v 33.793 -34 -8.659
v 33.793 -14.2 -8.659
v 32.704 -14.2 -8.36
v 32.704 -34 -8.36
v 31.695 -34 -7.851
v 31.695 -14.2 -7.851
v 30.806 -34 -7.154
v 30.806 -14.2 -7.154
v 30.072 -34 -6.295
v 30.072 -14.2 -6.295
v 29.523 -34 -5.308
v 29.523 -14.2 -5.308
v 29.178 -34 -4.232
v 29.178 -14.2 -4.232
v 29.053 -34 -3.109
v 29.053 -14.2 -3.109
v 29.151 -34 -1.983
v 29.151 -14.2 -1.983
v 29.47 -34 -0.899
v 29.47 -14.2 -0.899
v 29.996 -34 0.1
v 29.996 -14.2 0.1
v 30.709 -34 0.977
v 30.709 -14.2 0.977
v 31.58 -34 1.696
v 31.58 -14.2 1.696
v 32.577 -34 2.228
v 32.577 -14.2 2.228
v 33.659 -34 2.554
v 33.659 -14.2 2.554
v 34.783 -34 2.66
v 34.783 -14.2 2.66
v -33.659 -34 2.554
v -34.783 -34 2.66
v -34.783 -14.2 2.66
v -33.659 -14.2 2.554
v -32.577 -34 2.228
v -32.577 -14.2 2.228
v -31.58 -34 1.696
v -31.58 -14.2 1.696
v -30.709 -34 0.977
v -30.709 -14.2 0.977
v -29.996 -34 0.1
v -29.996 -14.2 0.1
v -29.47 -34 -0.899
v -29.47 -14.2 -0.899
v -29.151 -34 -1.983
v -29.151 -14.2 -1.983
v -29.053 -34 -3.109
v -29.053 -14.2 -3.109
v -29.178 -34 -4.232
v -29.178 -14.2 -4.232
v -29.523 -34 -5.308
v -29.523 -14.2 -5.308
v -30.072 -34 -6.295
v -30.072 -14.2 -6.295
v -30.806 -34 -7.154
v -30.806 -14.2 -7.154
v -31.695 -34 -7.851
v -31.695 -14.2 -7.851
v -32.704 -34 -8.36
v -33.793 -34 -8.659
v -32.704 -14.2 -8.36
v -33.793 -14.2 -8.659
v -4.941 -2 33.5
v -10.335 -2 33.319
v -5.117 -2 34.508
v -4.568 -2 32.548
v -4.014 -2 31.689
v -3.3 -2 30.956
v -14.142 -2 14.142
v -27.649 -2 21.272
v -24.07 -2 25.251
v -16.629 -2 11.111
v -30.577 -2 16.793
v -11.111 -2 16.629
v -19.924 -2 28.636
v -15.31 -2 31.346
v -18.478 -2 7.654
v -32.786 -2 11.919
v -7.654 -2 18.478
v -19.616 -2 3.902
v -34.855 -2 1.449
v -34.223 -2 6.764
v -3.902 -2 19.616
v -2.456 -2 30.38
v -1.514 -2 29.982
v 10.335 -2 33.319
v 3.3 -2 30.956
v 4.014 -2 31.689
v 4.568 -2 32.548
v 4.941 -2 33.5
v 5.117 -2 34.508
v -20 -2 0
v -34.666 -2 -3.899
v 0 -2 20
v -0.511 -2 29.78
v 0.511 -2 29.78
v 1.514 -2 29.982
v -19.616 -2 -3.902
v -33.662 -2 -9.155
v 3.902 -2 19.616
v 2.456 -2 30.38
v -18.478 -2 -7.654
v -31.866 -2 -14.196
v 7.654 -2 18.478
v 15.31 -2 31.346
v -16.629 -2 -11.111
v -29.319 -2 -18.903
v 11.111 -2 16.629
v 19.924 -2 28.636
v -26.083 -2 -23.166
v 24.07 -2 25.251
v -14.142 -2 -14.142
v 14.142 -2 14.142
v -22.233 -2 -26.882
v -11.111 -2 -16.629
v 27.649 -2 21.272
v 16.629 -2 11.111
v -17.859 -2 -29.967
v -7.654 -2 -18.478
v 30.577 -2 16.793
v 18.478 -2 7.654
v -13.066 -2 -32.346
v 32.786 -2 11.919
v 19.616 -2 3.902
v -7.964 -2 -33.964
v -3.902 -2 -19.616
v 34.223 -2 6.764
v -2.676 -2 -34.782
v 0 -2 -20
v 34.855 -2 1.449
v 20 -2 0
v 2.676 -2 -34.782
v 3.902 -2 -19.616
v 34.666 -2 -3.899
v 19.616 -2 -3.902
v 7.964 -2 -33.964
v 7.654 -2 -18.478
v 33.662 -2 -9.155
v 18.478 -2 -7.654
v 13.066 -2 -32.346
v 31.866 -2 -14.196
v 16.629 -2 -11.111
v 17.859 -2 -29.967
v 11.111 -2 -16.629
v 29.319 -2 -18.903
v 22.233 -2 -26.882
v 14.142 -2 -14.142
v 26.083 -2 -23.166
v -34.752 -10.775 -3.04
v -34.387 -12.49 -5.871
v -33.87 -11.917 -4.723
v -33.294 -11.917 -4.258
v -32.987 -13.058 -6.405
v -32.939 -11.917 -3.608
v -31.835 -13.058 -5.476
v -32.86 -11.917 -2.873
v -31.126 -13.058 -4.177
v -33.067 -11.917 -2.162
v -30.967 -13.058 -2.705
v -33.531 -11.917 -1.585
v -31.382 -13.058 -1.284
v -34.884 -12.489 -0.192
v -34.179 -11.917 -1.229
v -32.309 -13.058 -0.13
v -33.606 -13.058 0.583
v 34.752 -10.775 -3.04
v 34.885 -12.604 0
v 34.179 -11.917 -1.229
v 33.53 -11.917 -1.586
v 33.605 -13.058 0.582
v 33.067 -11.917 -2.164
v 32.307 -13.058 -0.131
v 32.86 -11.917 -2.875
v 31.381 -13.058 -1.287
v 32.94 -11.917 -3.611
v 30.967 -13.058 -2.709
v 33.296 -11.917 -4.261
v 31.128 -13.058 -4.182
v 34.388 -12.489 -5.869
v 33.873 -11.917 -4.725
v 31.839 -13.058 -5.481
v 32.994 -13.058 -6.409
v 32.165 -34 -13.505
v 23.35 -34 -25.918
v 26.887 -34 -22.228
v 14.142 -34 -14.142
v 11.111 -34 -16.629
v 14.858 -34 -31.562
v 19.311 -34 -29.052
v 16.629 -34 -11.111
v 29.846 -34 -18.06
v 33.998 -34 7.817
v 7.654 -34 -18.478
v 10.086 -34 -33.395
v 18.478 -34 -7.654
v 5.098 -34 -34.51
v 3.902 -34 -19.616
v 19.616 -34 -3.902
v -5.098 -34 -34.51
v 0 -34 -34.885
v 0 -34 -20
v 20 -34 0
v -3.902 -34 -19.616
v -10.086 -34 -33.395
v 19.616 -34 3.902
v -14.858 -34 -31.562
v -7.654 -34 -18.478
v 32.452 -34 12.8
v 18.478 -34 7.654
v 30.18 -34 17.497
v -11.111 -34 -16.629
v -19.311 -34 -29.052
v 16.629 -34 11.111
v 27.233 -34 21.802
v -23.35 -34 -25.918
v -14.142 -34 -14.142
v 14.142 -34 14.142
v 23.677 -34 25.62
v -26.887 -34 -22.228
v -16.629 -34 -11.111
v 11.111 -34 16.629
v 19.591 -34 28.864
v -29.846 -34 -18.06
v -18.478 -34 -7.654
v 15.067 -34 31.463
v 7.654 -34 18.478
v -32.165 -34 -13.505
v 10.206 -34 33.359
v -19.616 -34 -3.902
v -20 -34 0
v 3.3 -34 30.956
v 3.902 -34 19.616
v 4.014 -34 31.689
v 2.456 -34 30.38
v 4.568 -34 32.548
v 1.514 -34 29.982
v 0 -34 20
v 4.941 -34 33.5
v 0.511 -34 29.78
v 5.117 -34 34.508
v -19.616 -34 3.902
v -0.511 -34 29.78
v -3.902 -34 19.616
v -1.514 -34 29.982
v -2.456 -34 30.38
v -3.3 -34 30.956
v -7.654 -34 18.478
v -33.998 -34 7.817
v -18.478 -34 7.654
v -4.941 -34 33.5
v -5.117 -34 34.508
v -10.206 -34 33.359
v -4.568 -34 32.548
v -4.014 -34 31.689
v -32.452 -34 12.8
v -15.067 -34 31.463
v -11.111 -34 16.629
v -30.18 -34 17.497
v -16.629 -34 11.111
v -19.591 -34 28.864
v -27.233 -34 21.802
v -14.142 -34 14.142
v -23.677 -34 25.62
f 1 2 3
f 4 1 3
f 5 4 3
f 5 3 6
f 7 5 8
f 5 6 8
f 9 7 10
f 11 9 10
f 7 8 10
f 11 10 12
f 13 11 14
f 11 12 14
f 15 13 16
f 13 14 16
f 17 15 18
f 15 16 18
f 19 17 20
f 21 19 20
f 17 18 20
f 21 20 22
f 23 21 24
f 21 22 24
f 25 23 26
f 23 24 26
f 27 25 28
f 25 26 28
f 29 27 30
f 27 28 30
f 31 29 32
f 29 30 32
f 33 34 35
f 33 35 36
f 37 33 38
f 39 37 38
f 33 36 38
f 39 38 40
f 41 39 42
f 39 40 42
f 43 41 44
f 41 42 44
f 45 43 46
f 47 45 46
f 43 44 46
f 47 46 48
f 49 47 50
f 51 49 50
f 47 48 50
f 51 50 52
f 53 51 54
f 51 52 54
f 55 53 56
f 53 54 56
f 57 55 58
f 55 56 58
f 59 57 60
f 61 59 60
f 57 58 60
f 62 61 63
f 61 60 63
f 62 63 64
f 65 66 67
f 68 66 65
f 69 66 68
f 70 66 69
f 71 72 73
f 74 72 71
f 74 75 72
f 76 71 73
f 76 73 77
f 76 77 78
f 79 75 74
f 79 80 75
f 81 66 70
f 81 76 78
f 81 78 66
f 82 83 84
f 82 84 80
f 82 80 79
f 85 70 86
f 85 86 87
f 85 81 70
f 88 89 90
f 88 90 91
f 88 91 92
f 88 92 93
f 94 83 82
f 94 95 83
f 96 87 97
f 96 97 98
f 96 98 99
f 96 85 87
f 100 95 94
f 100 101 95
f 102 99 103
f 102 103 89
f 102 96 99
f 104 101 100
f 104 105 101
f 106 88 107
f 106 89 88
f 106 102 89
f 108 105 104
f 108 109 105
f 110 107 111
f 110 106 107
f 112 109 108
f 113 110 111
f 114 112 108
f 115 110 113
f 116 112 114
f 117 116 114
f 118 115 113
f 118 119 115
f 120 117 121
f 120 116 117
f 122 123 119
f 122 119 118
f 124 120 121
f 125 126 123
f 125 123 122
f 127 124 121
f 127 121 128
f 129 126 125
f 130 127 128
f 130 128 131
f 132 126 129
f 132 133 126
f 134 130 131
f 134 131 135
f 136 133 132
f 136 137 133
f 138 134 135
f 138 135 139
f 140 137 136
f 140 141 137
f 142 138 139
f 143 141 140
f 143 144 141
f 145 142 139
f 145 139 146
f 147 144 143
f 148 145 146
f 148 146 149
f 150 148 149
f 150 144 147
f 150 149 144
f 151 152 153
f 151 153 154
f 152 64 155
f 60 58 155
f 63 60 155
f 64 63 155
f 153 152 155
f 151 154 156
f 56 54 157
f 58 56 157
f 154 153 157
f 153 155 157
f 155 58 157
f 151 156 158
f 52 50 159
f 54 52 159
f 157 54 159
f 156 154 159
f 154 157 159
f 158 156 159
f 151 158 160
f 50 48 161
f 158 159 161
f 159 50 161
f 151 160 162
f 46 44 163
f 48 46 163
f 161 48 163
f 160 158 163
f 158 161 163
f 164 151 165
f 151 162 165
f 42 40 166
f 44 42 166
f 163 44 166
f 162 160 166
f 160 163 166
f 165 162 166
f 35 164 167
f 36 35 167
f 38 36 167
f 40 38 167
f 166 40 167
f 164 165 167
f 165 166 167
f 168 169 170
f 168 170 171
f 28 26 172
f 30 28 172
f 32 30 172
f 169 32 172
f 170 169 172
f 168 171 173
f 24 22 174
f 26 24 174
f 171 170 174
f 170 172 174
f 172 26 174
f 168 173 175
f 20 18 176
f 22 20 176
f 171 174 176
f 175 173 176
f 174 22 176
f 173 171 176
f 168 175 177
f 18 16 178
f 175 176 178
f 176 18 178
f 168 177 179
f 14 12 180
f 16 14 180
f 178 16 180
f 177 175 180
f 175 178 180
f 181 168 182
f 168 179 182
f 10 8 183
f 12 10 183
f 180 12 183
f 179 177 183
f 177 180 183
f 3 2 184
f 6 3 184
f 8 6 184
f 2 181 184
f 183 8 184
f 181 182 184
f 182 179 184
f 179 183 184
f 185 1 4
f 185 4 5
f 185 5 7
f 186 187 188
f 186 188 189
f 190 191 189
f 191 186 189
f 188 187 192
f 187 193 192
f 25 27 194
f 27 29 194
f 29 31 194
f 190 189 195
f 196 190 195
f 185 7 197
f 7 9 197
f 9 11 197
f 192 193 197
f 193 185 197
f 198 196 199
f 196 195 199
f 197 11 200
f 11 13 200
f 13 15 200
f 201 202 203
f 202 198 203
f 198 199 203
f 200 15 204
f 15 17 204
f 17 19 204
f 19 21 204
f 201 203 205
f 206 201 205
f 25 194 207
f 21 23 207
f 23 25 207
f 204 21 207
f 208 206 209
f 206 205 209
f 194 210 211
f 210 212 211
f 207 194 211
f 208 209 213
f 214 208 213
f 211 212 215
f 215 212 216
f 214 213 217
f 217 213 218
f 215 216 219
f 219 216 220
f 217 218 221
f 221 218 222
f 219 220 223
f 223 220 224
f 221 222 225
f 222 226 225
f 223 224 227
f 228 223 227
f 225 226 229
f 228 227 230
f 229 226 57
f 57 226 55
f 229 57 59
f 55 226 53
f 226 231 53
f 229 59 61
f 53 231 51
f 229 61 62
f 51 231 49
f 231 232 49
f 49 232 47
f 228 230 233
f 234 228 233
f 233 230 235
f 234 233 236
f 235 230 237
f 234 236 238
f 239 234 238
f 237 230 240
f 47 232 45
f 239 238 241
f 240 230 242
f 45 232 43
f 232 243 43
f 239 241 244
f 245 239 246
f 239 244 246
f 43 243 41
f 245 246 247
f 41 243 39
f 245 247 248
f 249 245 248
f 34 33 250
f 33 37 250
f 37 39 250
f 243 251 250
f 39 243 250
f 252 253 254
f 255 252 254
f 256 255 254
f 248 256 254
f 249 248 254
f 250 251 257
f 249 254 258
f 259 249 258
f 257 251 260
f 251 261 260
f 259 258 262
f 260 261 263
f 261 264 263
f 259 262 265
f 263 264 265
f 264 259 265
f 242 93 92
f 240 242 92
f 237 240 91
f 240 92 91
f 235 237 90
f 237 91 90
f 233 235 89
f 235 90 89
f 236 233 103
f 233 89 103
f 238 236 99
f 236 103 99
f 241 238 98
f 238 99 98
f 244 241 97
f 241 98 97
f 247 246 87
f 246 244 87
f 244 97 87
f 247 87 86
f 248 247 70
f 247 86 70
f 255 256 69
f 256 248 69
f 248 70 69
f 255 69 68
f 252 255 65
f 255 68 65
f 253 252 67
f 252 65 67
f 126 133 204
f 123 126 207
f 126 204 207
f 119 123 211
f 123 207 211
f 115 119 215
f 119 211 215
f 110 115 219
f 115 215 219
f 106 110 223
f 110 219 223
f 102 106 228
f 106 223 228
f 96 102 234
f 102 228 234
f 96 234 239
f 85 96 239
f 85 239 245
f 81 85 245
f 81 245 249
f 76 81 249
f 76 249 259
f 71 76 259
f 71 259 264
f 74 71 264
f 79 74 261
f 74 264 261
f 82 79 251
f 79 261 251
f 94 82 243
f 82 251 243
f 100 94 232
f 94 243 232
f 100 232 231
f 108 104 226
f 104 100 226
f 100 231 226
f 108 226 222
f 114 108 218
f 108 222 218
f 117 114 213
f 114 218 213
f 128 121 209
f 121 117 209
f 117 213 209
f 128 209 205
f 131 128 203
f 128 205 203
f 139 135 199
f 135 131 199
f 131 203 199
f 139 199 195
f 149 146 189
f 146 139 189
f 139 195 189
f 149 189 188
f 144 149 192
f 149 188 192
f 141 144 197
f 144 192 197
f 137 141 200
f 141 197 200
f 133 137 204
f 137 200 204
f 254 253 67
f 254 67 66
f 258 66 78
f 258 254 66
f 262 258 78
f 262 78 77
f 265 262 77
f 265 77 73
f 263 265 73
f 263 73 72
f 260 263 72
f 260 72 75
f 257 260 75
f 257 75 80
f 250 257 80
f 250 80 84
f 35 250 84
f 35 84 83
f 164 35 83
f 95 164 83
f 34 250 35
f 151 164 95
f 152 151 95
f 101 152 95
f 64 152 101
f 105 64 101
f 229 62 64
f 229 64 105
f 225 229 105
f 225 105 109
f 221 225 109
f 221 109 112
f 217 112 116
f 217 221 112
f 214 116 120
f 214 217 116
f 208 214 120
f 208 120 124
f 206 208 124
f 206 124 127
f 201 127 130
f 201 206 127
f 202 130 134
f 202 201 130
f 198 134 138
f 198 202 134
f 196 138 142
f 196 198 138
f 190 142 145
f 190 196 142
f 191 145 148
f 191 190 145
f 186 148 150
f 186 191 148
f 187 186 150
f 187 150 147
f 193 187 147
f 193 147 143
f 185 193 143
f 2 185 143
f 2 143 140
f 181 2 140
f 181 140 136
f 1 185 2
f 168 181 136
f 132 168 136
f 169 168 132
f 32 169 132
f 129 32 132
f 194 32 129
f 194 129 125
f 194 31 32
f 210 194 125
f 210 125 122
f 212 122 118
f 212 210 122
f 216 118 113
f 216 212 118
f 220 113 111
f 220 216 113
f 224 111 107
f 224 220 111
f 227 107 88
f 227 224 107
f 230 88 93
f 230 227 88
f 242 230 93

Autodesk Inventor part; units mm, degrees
ref_plane "YZ Plane" through (0, 0, 0) normal (1, 0, 0) x (0, 1, 0)
ref_plane "XZ Plane" through (0, 0, 0) normal (0, 1, 0) x (-1, 0, 0)
ref_plane "XY Plane" through (0, 0, 0) normal (0, 0, 1) x (1, 0, 0)
sketch "Schizzo1" plane through (0, 0, 0) normal (0, 1, 0) x (-1, 0, 0)
  circle A0 centre (0, 0) radius 15
  circle A1 centre (0, 0) radius 40
  dimension "d0" = 30
  dimension "d1" = 80
extrude "Estrusione1" add sketch "Schizzo1" against normal blind 34
sketch "Schizzo2" plane through (0, -34, 0) normal (0, -1, 0) x (1, 0, 0)
  circle A0 centre (0, 0) radius 15
  circle A1 centre (0, 0) radius 42.5
  dimension "d4" = 85
extrude "Estrusione2" add sketch "Schizzo2" against normal blind 34
sketch "Schizzo3" plane through (0, -34, 0) normal (0, -1, 0) x (1, 0, 0)
  circle A0 centre (0, 0) radius 34.885
  line L0 (0, 41.5801) -> (0, 0)
  line L1 (0, 0) -> (-42.3383, -3.7041)
  circle A1 centre (0, 0) radius 42.5 projected
  line L2 (42.3383, -3.7041) -> (0, 0)
  point P0 (-34.7523, -3.0404)
  point P1 (34.7523, -3.0404)
  dimension "d7" = 69.77
  dimension "d8" = 95
  dimension "d9" = 95
hole "Foro1" at (-34.7523, -34, -3.0404) at (34.7523, -34, -3.0404) direction (0, 1, 0) diameter 11.4 depth 19.8 tip angle 118 clearance for "Bullone a testa esagonale" size "7/16" standard "ANSI Unificate - Filettature"
sketch "Schizzo4" plane through (0, -34, 0) normal (0, -1, 0) x (1, 0, 0)
  circle A0 centre (0, 0) radius 34.885
  point P0 (0, 34.885)
  dimension "d17" = 69.77
hole "Foro2" at (0, -34, 34.885) direction (0, 1, 0) diameter 10.262 depth 32 tip angle 118 thread size "7/16-32 UN" class "2B" standard "ANSI Unified Screw Threads"
sketch "Schizzo5" plane through (0, -34, 0) normal (0, -1, 0) x (1, 0, 0)
  circle A0 centre (0, 0) radius 20
  dimension "d25" = 40
extrude "Estrusione3" cut sketch "Schizzo5" against normal blind 34
sketch "Schizzo6" plane through (0, 0, 0) normal (0, 1, 0) x (1, 0, 0)
  circle A0 centre (0, 0) radius 20 projected
  circle A1 centre (0, -34.885) radius 1.8024 projected
  circle A2 centre (0, 0) radius 42.5 projected
extrude "Estrusione4" cut sketch "Schizzo6" against normal blind 2
sketch "Schizzo7" plane through (0, -34, 0) normal (0, -1, 0) x (1, 0, 0)
  circle A0 centre (0, 0) radius 34.885
  circle A1 centre (0, 0) radius 42.5
  dimension "d30" = 69.77
extrude "Estrusione5" cut sketch "Schizzo7" against normal blind 32
properties part number "sfacciatura + tornitura piana interna ed esterna" material "Ferro, Ghisa grigia ASTM A48 Grado 20"
